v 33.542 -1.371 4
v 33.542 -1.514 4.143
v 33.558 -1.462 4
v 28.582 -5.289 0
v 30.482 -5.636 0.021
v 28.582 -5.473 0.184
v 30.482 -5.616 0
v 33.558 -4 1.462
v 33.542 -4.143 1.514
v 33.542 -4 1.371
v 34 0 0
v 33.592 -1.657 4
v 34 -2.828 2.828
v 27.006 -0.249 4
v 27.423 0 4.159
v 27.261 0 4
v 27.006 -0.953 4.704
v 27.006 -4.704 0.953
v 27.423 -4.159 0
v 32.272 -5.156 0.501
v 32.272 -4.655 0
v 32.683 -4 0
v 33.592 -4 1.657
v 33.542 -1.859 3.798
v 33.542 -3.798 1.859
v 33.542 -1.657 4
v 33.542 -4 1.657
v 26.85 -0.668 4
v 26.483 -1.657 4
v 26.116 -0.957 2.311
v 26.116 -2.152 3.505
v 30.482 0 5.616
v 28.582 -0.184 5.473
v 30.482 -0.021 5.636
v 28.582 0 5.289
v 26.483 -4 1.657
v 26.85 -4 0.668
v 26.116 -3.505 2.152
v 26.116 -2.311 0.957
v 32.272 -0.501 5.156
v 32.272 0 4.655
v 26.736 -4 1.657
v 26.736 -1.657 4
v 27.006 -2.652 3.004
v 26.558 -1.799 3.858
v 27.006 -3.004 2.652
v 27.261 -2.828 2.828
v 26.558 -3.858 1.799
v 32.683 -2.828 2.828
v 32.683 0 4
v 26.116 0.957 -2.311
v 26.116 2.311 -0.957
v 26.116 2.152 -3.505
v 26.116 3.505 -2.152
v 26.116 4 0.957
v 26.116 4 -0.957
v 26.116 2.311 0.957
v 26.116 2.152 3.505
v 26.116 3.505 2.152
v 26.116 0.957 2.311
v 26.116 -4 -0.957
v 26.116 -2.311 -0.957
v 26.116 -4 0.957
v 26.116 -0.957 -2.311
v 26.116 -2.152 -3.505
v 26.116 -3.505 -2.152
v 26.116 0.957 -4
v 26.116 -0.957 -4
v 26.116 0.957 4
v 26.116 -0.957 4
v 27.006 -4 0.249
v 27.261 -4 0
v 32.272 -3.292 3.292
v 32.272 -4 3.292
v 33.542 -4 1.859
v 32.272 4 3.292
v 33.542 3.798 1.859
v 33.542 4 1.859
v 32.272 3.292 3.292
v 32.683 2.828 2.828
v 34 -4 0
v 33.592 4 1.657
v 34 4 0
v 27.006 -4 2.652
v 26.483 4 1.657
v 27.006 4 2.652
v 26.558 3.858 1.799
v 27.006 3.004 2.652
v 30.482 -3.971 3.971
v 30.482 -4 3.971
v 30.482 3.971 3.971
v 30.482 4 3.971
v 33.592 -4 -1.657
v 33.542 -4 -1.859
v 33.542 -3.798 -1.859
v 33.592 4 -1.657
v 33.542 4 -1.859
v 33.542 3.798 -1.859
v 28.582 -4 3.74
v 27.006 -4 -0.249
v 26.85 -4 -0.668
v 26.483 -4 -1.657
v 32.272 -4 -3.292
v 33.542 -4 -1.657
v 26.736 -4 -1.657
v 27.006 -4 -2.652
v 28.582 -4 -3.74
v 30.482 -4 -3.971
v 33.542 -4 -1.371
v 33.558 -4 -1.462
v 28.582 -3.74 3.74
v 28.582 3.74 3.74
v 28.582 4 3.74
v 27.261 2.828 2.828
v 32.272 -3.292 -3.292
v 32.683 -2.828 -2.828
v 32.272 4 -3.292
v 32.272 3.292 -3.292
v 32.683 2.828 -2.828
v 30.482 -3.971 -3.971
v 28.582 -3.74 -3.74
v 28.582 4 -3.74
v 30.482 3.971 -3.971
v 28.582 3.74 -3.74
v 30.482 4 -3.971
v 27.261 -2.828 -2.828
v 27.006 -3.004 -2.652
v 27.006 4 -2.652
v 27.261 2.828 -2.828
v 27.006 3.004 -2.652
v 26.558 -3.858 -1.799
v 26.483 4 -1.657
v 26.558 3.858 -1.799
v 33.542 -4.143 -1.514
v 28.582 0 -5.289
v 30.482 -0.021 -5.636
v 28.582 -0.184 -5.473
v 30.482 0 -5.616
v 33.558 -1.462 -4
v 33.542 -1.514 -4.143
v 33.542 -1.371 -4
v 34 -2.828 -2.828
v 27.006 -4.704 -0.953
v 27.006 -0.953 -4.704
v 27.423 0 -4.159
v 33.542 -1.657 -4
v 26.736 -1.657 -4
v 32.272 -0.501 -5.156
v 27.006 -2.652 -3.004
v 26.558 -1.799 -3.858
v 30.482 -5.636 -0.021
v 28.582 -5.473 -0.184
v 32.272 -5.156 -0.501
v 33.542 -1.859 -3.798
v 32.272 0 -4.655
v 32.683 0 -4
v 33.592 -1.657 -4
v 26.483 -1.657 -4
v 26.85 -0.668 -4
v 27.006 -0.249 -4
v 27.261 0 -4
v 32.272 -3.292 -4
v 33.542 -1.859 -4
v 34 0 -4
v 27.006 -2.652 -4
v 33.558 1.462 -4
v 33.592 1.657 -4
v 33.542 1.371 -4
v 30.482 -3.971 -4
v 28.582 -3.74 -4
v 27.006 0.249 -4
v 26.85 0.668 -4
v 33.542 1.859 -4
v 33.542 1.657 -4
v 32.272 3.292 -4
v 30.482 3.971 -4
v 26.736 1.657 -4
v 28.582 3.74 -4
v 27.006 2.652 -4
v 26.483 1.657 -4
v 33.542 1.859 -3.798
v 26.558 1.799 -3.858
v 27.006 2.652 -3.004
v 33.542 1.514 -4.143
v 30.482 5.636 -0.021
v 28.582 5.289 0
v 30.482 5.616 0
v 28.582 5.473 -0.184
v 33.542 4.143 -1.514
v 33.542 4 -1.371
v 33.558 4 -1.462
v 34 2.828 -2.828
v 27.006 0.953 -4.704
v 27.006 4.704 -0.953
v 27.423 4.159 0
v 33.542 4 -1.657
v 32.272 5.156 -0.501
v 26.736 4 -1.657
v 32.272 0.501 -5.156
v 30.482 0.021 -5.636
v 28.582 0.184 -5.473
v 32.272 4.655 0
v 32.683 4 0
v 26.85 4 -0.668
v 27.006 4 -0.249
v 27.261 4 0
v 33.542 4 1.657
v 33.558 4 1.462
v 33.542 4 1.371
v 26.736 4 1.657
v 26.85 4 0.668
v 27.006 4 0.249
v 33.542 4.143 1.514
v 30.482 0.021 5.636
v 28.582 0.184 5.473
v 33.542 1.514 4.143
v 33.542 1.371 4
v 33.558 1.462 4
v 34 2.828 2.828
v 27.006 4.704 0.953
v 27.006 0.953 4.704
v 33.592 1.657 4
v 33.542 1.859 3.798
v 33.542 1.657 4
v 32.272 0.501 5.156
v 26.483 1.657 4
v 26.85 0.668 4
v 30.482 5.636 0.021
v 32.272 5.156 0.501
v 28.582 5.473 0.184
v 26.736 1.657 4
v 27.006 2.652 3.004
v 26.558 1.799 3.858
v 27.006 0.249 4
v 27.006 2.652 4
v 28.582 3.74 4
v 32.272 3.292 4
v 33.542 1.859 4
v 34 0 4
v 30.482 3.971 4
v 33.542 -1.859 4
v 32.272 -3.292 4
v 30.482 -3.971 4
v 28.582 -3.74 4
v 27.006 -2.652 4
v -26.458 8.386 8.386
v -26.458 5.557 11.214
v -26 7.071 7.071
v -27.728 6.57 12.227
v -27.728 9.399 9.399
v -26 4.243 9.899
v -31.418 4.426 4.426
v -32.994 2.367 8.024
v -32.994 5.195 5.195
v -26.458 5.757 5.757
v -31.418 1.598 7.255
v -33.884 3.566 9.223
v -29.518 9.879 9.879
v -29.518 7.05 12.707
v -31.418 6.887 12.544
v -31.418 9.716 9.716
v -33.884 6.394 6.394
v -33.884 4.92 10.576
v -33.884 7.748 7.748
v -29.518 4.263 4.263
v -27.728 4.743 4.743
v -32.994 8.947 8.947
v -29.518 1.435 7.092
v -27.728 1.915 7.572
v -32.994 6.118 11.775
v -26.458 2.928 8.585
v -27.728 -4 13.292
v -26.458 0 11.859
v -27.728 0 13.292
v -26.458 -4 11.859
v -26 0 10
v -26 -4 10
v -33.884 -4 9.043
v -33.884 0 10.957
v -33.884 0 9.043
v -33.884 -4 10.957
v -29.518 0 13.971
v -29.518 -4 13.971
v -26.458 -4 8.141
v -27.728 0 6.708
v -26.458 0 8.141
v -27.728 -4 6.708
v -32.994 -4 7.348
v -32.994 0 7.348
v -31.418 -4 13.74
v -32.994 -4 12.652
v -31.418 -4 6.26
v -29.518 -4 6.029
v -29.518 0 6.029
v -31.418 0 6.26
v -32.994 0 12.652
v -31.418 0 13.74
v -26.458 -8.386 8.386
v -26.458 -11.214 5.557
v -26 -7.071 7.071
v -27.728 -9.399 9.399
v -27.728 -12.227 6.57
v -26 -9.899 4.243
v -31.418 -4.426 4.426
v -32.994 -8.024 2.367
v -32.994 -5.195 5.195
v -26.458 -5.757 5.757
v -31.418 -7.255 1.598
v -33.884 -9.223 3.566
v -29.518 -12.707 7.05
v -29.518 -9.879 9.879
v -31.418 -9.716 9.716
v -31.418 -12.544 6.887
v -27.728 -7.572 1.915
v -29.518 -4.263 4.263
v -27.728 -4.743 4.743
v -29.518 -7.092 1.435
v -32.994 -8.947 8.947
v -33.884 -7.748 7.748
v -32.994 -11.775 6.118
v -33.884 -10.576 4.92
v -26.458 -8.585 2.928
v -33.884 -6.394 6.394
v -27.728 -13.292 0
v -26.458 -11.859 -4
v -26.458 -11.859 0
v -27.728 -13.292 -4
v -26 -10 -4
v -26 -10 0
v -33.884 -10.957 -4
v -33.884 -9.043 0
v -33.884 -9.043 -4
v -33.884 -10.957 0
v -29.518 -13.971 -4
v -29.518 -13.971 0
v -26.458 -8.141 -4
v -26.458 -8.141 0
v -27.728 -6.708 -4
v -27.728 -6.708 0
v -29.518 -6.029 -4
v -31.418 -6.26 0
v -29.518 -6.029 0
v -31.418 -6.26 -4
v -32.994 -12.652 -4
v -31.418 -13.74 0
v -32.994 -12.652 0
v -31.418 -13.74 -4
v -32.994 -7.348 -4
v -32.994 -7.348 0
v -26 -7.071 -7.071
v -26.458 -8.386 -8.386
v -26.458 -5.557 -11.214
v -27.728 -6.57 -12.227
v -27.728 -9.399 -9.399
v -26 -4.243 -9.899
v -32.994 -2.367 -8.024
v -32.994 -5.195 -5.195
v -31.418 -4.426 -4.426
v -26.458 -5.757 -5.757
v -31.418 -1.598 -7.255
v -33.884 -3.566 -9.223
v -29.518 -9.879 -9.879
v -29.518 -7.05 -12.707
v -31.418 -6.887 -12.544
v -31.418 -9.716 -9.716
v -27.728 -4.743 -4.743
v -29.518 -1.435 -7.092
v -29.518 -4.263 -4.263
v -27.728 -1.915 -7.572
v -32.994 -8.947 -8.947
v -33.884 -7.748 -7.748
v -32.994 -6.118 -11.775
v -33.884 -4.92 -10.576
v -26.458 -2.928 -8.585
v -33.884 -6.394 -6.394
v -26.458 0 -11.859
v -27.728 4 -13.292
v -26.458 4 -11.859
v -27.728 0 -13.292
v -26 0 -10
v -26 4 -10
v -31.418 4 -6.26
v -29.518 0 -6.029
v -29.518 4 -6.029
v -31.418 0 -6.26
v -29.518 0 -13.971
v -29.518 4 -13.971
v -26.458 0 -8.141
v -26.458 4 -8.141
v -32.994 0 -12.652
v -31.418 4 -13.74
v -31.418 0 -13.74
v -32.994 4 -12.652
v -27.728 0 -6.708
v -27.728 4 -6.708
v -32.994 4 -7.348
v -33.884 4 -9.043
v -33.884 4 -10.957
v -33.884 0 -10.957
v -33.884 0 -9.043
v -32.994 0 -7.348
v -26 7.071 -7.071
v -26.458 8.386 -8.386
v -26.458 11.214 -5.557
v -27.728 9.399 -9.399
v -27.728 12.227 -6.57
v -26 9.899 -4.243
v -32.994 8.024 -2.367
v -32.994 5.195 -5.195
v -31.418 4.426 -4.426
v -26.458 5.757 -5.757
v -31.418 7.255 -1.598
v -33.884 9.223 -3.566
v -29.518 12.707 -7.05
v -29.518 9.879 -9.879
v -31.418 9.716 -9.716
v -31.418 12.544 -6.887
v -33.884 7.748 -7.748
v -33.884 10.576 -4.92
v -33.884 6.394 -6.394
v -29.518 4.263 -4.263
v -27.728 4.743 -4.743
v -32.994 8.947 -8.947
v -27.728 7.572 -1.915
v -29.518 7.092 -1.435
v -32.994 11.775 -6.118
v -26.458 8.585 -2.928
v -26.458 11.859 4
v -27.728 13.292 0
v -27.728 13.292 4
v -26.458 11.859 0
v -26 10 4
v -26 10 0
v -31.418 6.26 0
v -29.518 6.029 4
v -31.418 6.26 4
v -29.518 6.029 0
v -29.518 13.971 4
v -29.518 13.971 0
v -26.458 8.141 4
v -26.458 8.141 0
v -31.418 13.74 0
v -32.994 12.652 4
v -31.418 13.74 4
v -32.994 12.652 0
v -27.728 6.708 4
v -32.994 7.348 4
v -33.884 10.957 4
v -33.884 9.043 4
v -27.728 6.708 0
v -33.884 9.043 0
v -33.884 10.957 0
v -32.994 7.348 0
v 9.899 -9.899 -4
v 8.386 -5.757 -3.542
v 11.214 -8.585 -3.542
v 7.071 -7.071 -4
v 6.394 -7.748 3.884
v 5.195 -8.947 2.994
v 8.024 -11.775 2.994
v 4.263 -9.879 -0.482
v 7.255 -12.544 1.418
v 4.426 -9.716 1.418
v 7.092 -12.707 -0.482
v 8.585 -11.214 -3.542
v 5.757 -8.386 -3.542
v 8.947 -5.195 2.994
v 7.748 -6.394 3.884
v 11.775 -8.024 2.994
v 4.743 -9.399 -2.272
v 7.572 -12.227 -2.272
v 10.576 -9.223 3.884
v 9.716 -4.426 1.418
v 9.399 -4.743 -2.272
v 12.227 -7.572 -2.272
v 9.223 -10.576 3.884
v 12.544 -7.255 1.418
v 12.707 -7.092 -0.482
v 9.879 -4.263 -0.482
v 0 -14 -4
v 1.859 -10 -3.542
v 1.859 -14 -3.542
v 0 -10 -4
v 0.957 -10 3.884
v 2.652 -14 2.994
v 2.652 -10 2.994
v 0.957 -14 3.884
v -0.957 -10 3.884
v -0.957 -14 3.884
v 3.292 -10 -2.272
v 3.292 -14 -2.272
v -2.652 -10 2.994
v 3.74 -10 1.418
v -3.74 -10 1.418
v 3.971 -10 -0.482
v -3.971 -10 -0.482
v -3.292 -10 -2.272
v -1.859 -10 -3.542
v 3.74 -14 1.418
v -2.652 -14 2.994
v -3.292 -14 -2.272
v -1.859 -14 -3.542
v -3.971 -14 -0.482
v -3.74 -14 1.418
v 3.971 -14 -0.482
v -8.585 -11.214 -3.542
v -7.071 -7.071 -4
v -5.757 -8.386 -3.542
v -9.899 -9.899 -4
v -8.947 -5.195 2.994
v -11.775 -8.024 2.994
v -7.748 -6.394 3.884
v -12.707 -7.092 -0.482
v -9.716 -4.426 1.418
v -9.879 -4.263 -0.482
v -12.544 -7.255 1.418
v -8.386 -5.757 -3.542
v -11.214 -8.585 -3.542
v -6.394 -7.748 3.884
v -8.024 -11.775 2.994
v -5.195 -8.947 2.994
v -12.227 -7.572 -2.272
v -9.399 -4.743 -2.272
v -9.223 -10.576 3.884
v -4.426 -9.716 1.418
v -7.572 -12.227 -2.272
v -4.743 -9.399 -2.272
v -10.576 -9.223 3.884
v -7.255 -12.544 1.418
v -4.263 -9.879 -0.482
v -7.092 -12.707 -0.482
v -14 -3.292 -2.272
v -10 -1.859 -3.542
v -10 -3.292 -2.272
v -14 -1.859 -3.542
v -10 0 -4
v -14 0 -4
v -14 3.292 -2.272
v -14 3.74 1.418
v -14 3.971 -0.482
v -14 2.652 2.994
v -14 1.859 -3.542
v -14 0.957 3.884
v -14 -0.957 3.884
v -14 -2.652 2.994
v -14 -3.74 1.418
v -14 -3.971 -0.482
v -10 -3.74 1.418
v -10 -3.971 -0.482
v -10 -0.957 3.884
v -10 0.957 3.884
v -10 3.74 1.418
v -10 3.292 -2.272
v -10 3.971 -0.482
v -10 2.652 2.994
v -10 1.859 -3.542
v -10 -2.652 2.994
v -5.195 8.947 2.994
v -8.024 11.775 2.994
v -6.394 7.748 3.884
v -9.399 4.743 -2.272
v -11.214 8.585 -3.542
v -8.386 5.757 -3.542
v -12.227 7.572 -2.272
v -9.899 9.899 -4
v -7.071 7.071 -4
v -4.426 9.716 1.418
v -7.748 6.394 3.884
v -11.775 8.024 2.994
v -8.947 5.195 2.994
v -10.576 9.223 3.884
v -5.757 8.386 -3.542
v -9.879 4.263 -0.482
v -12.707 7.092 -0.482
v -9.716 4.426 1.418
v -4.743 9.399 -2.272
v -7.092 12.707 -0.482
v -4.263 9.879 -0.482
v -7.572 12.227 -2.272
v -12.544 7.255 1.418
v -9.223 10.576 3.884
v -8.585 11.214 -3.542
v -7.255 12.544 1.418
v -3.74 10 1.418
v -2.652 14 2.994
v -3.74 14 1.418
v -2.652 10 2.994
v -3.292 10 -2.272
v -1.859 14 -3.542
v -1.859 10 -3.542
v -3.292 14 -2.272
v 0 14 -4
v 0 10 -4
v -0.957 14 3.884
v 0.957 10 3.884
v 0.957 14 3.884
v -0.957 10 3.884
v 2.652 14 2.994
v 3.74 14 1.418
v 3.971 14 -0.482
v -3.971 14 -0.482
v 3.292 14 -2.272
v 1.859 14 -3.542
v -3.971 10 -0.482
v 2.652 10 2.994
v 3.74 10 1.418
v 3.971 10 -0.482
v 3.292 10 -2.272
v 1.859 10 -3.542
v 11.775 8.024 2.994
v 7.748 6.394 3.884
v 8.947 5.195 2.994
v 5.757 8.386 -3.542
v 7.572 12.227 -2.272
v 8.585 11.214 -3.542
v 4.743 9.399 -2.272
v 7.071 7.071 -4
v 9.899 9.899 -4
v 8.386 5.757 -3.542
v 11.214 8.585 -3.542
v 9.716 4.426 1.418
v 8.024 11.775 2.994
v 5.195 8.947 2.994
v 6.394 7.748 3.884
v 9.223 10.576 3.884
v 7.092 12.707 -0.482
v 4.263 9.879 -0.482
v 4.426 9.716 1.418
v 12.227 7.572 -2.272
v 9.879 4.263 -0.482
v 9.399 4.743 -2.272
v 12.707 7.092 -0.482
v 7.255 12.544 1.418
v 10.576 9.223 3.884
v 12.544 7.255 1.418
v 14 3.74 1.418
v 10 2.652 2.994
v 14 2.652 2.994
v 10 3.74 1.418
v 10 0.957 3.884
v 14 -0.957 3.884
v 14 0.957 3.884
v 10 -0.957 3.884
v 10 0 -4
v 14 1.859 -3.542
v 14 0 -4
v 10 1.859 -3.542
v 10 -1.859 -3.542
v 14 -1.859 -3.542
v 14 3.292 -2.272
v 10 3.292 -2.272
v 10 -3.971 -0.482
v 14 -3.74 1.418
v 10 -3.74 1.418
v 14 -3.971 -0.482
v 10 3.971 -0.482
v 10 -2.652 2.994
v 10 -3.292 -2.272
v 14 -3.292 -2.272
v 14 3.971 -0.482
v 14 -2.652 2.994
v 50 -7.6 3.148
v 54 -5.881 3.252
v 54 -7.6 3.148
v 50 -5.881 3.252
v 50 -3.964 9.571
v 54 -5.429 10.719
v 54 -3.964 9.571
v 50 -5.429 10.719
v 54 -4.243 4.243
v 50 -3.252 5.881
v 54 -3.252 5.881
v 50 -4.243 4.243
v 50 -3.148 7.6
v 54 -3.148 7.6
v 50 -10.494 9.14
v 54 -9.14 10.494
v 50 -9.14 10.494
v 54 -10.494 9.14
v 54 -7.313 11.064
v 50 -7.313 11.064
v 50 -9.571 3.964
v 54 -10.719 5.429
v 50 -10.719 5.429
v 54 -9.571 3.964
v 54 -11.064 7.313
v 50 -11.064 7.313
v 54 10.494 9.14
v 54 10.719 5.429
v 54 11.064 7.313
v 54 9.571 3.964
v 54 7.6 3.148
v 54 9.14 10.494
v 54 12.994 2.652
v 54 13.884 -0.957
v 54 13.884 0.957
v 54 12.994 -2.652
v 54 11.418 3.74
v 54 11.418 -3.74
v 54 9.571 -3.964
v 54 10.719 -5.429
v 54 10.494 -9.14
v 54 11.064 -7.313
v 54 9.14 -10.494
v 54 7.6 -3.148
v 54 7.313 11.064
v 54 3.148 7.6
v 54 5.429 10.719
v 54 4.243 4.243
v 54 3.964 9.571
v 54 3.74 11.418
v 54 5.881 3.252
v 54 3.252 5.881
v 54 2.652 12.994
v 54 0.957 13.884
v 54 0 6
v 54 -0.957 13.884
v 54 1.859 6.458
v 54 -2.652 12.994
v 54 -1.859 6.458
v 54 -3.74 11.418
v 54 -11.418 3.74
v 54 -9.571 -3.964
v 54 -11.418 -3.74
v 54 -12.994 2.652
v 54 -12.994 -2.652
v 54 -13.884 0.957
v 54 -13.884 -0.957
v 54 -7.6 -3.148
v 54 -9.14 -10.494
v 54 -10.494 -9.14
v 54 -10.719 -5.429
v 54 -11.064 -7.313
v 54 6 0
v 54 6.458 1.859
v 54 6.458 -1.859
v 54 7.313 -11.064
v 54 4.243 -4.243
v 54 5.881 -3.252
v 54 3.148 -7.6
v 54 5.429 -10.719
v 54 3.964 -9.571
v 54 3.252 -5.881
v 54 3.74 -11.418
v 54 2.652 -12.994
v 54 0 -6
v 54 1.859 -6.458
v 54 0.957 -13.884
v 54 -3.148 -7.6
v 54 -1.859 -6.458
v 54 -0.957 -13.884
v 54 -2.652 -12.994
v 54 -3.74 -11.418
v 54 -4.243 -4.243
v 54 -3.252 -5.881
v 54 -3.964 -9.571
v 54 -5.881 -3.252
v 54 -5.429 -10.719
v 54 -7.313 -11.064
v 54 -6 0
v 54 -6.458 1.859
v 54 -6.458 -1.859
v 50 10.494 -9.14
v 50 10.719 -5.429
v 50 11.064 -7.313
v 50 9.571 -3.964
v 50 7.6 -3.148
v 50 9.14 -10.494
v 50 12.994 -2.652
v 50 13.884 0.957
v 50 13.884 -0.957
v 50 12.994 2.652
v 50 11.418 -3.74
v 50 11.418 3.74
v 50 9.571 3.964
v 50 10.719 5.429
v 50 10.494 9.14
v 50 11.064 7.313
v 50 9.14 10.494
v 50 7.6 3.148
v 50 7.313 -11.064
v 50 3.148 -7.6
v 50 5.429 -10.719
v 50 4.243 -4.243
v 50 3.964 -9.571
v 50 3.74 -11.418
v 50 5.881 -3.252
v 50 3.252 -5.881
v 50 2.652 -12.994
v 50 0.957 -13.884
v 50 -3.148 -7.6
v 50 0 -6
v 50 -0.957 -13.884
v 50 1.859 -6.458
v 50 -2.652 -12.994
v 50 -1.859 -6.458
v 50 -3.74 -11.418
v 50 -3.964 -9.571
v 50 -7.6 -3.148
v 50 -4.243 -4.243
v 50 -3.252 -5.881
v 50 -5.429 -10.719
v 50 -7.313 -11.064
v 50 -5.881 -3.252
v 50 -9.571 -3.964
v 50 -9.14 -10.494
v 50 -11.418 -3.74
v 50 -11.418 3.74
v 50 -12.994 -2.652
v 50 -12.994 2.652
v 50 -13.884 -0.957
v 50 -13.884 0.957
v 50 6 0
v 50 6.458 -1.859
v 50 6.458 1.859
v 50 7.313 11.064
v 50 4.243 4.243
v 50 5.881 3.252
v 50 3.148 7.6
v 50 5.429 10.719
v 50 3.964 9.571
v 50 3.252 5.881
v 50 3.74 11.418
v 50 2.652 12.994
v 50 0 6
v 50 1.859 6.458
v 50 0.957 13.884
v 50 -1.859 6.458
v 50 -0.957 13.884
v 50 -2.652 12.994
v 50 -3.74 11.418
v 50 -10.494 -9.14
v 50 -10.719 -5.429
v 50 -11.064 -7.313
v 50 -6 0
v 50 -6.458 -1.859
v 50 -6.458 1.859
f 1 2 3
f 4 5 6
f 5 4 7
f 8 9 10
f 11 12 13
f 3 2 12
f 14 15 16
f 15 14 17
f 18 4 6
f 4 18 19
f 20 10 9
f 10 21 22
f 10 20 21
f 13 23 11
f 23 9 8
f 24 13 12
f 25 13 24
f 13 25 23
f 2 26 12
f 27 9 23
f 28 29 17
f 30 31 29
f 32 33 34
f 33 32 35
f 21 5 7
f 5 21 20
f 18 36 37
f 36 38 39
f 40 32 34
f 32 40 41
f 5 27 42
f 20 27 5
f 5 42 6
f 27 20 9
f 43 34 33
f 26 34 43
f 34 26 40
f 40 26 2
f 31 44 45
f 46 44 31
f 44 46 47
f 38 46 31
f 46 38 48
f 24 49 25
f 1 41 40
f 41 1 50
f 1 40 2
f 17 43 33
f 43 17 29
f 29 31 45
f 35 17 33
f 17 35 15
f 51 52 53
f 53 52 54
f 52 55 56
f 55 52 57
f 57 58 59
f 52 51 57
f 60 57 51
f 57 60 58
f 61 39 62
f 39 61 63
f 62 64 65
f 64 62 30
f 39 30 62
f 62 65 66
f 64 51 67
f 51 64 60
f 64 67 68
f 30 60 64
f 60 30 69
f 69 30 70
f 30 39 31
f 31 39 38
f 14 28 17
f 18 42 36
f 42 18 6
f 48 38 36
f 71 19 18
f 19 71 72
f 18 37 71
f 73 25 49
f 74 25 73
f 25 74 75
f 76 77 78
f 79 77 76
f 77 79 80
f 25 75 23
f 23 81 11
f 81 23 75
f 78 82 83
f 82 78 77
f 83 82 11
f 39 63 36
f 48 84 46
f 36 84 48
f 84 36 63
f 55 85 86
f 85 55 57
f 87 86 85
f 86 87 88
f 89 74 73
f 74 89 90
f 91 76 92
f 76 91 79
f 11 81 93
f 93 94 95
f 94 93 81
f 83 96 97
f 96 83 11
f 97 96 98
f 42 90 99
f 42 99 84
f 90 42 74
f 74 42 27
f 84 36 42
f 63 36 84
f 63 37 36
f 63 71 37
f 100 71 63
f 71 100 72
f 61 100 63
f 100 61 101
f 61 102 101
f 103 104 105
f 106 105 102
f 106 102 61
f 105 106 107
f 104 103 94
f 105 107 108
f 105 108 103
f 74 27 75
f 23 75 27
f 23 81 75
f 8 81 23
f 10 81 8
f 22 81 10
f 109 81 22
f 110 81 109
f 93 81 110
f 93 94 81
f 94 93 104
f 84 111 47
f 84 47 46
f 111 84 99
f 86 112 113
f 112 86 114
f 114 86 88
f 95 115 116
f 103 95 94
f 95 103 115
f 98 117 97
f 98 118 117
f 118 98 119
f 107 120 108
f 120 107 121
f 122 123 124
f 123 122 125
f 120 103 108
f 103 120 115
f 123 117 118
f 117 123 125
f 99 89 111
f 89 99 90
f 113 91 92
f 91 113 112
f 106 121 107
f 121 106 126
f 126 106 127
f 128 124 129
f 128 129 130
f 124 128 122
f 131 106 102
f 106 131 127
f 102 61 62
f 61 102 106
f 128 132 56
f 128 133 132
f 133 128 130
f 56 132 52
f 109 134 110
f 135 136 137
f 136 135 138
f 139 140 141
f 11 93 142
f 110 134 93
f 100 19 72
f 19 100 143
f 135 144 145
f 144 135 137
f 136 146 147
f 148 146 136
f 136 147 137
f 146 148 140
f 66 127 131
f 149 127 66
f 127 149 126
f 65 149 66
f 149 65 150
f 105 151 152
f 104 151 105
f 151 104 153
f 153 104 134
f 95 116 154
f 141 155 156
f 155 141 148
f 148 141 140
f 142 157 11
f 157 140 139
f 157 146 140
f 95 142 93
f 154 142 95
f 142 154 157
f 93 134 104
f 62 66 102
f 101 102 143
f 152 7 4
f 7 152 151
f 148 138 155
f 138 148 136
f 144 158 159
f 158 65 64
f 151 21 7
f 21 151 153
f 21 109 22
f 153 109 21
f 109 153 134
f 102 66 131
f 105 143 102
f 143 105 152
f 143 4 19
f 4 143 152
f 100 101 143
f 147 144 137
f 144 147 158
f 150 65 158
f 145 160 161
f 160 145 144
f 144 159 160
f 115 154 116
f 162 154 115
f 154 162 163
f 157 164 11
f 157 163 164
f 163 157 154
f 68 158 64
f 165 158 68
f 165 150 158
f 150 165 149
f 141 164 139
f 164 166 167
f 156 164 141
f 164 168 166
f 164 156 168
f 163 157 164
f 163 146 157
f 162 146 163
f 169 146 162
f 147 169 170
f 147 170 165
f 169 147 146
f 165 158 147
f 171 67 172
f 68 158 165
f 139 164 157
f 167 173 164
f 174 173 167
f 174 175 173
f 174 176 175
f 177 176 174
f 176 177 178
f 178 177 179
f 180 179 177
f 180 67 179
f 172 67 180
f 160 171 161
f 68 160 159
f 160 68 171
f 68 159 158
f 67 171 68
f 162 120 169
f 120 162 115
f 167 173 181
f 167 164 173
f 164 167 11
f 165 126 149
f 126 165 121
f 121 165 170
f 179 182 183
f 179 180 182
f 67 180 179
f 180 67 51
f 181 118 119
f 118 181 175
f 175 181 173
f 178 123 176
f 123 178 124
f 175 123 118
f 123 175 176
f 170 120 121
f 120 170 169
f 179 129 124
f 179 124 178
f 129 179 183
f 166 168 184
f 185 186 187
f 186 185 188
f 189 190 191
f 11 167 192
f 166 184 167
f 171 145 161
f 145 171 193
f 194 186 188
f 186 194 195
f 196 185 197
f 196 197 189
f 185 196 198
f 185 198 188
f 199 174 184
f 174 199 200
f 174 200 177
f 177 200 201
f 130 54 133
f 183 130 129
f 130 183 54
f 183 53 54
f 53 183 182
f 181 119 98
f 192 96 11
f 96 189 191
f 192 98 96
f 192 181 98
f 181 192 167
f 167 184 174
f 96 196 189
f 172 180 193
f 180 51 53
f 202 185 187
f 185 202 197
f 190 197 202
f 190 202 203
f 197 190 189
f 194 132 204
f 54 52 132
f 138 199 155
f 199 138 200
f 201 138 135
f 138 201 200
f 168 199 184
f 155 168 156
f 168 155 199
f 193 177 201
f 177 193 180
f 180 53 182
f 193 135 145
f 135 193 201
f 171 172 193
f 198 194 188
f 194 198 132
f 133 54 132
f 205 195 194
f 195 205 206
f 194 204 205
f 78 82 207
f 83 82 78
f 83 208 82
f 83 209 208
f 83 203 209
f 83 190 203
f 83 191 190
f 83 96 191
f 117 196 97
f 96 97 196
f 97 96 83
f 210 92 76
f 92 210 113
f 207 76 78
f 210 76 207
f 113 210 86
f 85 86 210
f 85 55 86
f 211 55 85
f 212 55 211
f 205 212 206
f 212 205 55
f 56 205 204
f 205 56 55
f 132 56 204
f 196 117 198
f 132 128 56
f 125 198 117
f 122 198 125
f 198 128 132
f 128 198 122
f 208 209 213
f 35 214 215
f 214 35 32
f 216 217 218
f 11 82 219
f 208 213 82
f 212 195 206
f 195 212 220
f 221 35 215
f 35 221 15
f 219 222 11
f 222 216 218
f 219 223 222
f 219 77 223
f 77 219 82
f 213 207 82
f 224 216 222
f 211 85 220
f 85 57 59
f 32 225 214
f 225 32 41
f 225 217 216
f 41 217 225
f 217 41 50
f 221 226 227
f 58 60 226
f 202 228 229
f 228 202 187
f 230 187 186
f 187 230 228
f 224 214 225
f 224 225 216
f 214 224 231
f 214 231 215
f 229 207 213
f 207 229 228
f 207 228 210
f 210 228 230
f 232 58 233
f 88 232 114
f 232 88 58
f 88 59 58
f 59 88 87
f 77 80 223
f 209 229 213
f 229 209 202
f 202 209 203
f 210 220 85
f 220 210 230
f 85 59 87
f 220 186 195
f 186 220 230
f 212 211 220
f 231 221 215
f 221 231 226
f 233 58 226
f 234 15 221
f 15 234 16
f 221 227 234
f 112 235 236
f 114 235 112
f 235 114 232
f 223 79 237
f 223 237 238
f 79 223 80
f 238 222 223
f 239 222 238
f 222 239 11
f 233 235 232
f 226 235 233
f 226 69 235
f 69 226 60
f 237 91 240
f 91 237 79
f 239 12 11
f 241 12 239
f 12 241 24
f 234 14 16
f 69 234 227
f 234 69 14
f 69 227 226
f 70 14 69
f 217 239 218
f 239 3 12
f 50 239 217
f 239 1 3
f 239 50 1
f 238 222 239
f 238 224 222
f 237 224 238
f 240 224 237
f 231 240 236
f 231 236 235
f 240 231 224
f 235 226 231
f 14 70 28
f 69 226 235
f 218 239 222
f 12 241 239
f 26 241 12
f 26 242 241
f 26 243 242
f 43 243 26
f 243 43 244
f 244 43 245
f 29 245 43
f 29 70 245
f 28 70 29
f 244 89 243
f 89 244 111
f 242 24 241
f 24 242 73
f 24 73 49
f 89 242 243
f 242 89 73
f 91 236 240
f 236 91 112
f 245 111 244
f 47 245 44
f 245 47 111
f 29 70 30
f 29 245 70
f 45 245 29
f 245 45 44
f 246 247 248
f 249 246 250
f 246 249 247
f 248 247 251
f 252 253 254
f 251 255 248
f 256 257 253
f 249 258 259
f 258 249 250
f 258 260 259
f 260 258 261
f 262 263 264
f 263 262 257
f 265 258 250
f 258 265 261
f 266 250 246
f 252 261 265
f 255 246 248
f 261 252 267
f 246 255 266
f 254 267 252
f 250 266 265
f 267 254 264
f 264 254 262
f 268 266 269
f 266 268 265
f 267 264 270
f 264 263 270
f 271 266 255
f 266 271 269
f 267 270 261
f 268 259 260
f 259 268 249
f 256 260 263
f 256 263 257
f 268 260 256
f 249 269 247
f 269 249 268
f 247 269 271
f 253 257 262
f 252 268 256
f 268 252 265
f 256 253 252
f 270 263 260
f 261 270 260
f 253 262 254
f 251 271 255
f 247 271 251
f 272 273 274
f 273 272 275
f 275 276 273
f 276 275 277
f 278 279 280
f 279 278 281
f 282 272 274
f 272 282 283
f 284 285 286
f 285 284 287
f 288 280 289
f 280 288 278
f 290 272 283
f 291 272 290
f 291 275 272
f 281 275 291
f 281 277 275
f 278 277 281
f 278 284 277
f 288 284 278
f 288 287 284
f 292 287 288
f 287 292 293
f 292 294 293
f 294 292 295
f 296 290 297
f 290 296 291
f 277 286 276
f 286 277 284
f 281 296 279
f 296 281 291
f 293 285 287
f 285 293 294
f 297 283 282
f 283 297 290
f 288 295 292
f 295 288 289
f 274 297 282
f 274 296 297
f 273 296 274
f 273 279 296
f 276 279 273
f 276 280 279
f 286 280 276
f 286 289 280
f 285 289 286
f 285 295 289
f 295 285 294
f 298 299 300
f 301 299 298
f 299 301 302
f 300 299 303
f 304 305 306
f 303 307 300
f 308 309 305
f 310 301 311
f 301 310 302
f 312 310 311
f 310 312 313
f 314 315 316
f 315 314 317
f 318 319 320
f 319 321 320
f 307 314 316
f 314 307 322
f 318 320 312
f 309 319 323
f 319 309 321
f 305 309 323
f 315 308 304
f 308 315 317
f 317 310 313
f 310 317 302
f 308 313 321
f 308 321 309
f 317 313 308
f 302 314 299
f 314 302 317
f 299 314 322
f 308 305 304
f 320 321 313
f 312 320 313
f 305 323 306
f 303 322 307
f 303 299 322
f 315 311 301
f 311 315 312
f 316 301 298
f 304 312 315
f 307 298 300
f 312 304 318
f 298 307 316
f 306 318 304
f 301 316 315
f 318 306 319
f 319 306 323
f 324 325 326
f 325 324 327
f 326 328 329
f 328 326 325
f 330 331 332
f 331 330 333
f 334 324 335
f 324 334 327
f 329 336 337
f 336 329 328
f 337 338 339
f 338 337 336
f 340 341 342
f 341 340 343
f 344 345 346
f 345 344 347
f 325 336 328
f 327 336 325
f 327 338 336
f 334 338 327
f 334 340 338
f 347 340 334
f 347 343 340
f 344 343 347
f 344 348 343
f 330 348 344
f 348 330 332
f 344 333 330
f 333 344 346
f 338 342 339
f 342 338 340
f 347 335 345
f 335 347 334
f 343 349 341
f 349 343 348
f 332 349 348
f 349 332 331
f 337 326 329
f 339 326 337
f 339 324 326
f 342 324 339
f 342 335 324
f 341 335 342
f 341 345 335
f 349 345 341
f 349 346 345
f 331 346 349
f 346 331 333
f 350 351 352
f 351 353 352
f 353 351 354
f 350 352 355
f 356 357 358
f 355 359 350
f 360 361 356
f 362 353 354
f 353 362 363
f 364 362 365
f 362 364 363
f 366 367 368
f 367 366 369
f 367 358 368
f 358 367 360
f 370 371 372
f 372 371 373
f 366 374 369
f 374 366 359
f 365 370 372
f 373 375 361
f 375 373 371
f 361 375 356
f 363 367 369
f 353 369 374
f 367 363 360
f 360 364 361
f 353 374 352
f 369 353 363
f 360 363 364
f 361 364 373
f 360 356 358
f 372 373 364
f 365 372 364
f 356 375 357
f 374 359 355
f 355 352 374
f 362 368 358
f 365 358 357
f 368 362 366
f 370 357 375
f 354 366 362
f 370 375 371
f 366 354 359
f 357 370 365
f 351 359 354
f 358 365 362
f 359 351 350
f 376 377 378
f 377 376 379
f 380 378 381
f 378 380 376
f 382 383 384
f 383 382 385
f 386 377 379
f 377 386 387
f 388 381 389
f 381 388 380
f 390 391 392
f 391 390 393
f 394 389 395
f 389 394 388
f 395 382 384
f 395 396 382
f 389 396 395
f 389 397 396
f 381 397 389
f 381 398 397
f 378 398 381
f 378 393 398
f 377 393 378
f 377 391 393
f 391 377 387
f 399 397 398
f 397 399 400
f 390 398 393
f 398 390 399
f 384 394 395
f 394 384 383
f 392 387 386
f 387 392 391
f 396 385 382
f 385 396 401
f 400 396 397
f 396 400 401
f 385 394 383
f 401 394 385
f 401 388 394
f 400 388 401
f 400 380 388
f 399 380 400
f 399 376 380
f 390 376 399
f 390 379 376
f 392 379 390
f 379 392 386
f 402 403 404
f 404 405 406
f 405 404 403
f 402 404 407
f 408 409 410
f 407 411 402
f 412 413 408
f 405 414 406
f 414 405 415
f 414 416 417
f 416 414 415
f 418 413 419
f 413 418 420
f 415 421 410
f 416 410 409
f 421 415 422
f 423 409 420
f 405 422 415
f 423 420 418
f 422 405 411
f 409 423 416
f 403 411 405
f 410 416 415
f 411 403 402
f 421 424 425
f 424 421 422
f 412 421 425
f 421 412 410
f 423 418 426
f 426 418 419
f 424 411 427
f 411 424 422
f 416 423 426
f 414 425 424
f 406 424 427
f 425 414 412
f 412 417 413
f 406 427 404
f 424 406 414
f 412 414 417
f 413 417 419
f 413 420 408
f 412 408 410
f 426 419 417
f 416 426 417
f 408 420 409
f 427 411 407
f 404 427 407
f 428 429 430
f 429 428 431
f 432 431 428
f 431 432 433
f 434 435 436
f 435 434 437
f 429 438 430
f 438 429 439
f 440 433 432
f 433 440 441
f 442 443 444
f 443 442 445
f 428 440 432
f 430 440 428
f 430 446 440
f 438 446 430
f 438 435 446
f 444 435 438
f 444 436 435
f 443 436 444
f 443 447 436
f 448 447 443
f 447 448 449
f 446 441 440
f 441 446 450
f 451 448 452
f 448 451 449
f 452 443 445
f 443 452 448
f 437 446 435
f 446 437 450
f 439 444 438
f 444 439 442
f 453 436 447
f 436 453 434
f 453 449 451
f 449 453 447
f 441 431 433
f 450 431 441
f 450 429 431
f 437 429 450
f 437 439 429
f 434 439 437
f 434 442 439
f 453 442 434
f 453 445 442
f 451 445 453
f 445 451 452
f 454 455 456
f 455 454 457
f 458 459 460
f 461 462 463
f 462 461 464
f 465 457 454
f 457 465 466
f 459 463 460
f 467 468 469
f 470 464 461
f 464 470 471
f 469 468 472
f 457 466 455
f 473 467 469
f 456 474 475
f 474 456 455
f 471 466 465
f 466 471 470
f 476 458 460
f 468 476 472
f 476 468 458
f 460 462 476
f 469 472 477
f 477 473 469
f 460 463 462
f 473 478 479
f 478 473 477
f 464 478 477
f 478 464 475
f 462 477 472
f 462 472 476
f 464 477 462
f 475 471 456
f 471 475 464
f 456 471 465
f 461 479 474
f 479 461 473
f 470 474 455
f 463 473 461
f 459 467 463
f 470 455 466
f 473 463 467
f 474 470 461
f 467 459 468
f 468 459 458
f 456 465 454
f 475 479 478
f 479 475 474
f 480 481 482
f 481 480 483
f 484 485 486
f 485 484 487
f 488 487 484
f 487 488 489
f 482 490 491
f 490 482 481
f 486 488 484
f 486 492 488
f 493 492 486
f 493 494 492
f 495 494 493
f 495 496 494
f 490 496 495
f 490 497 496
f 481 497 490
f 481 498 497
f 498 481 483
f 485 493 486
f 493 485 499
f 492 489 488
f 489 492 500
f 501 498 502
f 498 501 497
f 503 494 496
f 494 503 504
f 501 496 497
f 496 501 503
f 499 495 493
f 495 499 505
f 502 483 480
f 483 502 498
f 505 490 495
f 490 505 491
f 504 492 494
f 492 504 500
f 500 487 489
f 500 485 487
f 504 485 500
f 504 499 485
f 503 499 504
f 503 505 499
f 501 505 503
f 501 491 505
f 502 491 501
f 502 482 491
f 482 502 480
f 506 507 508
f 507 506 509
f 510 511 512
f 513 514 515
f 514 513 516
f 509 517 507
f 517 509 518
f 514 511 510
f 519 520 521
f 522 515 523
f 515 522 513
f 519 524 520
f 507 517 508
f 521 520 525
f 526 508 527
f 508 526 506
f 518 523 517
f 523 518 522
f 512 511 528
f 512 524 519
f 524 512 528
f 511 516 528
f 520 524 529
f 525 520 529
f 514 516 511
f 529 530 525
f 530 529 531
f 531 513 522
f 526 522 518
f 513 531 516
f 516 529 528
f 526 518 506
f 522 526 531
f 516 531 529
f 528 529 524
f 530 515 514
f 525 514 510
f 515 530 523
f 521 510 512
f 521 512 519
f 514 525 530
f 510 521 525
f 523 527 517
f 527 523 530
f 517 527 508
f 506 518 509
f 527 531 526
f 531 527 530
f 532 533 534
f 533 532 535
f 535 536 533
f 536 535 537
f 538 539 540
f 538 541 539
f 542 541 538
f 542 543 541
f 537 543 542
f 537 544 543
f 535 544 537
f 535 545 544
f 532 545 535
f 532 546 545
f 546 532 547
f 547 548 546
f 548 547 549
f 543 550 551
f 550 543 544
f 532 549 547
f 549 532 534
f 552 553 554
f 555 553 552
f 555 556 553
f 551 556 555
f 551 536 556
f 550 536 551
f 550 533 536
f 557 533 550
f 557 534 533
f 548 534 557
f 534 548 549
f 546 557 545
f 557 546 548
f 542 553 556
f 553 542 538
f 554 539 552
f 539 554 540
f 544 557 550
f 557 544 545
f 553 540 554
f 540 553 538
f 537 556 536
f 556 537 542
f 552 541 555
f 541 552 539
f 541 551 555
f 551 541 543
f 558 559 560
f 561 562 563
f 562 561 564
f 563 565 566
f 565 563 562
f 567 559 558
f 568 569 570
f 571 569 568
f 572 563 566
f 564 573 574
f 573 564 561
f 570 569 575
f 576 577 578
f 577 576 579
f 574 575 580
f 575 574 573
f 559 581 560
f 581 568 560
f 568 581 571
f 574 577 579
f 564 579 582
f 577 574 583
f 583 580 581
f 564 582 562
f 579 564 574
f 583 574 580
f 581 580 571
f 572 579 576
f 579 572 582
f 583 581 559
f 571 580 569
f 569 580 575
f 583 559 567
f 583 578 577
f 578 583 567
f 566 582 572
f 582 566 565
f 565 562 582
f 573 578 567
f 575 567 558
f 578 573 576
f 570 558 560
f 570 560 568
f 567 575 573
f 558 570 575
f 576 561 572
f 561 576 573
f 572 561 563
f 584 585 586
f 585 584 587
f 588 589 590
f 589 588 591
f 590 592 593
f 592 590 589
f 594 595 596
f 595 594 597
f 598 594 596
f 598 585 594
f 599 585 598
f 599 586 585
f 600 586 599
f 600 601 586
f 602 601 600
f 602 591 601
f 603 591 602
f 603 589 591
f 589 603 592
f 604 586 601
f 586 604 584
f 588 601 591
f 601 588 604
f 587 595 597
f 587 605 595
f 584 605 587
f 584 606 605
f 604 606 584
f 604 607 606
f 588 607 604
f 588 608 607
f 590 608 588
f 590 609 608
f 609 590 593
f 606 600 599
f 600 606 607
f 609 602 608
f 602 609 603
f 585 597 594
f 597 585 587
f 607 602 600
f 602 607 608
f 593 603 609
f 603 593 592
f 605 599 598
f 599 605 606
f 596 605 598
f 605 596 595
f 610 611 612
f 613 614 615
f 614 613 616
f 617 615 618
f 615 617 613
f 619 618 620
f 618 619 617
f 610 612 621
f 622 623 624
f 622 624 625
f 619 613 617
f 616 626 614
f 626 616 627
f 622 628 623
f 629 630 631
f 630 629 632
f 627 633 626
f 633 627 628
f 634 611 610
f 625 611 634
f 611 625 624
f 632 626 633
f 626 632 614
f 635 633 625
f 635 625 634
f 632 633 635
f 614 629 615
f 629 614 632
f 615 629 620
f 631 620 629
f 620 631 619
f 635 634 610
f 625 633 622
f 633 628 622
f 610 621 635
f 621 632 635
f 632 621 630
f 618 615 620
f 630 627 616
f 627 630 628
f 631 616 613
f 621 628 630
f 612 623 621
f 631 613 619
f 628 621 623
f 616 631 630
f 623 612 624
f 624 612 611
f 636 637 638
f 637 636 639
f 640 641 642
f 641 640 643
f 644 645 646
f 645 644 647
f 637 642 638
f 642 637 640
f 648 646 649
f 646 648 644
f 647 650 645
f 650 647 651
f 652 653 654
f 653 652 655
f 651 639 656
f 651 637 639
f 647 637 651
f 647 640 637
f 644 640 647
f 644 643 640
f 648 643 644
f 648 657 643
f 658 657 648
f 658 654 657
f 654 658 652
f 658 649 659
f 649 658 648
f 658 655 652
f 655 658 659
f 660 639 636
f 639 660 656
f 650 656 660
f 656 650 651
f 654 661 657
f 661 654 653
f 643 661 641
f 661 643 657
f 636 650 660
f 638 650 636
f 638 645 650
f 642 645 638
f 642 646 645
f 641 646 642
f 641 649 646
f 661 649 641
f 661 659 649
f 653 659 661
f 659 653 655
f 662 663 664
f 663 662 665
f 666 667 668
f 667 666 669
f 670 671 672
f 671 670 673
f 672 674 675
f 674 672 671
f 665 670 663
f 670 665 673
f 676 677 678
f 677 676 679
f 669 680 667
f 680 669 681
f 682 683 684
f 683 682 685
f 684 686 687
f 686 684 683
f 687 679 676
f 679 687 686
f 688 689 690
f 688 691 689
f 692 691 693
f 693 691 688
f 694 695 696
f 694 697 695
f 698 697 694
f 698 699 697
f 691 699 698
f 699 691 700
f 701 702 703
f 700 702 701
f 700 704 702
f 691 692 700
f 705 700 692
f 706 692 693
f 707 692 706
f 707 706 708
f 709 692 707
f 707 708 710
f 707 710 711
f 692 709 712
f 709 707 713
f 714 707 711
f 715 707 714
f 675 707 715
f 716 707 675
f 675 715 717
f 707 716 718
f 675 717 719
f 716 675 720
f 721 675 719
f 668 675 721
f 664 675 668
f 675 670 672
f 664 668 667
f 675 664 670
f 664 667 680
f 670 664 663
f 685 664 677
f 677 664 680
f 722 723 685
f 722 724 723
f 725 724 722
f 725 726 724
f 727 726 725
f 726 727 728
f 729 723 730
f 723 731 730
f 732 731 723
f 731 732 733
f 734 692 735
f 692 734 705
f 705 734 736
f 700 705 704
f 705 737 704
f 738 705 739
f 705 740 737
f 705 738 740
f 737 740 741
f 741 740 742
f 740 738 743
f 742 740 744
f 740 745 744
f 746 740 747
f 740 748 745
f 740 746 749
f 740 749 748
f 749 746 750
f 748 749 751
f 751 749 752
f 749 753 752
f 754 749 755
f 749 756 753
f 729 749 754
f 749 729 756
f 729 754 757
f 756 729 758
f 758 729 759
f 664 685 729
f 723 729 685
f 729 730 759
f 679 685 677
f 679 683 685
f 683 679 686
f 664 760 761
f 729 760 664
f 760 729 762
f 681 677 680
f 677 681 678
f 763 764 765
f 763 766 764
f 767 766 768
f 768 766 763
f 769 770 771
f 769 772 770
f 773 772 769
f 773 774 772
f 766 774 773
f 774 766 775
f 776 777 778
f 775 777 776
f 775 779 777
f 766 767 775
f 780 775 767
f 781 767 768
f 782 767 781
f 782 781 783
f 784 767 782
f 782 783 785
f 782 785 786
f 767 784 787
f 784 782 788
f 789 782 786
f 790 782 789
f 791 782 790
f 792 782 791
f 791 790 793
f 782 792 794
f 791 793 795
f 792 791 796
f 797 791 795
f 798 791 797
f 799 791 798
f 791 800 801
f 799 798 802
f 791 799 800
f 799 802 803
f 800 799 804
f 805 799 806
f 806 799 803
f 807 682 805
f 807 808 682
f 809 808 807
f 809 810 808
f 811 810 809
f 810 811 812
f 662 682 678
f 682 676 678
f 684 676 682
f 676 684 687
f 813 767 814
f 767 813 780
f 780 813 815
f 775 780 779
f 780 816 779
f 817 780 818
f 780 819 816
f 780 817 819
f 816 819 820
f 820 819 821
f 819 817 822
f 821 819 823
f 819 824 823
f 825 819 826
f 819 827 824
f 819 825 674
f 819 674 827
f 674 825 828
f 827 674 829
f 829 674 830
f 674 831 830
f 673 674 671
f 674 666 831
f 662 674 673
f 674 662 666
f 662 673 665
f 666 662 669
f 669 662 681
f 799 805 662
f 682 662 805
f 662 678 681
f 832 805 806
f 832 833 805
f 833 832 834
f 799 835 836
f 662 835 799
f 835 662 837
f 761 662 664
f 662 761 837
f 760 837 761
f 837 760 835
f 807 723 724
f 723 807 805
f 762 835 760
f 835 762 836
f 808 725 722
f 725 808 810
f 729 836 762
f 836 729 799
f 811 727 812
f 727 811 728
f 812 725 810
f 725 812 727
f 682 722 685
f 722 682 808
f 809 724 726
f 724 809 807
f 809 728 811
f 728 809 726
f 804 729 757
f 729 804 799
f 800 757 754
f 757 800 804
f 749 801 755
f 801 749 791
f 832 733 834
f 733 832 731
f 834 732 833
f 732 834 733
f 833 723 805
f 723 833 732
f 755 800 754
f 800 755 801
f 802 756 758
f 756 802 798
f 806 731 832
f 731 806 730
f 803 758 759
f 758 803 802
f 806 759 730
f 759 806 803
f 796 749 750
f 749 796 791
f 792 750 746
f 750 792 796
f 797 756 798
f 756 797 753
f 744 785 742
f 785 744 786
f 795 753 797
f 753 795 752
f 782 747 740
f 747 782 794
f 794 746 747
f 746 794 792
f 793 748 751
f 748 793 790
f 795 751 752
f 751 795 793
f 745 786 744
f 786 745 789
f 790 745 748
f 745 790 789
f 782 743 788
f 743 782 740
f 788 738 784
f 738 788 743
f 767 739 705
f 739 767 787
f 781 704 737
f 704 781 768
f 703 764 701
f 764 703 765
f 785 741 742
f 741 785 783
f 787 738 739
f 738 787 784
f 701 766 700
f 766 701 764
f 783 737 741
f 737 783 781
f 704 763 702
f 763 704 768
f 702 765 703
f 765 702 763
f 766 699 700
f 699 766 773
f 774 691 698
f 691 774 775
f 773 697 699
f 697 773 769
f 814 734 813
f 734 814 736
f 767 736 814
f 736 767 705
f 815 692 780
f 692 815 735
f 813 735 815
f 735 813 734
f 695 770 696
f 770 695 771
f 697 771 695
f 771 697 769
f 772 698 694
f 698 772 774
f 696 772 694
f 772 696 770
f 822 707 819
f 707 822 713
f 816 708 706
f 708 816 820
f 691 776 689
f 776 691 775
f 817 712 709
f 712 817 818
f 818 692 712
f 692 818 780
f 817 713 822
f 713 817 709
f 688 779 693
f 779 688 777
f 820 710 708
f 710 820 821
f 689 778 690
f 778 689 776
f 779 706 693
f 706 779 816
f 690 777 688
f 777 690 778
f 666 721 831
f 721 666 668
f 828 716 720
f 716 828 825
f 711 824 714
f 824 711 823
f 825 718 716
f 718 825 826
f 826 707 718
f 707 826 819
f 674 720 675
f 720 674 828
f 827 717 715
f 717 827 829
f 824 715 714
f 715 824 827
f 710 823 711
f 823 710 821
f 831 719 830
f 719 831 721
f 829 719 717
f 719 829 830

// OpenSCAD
 for(s = [45:45:360]){ 
    rotate([s,0,0]) translate ([30,0,0])  cylinder(h=4, r=4); 
}

for(s = [45:45:360]){ 
    rotate([s,0,0]) translate ([-30,10,0])  cylinder(h=4, r=4); 
}

 for(s = [45:45:360]){ 
    rotate([s,90,0]) translate ([0,0,10])  cylinder(h=4, r=4); 
}

 for(s = [45:45:360]){ 
    rotate([s,0,0]) translate ([50,0,10])  rotate([0,90,0]) cylinder(h=4, r=4); 
}
 
